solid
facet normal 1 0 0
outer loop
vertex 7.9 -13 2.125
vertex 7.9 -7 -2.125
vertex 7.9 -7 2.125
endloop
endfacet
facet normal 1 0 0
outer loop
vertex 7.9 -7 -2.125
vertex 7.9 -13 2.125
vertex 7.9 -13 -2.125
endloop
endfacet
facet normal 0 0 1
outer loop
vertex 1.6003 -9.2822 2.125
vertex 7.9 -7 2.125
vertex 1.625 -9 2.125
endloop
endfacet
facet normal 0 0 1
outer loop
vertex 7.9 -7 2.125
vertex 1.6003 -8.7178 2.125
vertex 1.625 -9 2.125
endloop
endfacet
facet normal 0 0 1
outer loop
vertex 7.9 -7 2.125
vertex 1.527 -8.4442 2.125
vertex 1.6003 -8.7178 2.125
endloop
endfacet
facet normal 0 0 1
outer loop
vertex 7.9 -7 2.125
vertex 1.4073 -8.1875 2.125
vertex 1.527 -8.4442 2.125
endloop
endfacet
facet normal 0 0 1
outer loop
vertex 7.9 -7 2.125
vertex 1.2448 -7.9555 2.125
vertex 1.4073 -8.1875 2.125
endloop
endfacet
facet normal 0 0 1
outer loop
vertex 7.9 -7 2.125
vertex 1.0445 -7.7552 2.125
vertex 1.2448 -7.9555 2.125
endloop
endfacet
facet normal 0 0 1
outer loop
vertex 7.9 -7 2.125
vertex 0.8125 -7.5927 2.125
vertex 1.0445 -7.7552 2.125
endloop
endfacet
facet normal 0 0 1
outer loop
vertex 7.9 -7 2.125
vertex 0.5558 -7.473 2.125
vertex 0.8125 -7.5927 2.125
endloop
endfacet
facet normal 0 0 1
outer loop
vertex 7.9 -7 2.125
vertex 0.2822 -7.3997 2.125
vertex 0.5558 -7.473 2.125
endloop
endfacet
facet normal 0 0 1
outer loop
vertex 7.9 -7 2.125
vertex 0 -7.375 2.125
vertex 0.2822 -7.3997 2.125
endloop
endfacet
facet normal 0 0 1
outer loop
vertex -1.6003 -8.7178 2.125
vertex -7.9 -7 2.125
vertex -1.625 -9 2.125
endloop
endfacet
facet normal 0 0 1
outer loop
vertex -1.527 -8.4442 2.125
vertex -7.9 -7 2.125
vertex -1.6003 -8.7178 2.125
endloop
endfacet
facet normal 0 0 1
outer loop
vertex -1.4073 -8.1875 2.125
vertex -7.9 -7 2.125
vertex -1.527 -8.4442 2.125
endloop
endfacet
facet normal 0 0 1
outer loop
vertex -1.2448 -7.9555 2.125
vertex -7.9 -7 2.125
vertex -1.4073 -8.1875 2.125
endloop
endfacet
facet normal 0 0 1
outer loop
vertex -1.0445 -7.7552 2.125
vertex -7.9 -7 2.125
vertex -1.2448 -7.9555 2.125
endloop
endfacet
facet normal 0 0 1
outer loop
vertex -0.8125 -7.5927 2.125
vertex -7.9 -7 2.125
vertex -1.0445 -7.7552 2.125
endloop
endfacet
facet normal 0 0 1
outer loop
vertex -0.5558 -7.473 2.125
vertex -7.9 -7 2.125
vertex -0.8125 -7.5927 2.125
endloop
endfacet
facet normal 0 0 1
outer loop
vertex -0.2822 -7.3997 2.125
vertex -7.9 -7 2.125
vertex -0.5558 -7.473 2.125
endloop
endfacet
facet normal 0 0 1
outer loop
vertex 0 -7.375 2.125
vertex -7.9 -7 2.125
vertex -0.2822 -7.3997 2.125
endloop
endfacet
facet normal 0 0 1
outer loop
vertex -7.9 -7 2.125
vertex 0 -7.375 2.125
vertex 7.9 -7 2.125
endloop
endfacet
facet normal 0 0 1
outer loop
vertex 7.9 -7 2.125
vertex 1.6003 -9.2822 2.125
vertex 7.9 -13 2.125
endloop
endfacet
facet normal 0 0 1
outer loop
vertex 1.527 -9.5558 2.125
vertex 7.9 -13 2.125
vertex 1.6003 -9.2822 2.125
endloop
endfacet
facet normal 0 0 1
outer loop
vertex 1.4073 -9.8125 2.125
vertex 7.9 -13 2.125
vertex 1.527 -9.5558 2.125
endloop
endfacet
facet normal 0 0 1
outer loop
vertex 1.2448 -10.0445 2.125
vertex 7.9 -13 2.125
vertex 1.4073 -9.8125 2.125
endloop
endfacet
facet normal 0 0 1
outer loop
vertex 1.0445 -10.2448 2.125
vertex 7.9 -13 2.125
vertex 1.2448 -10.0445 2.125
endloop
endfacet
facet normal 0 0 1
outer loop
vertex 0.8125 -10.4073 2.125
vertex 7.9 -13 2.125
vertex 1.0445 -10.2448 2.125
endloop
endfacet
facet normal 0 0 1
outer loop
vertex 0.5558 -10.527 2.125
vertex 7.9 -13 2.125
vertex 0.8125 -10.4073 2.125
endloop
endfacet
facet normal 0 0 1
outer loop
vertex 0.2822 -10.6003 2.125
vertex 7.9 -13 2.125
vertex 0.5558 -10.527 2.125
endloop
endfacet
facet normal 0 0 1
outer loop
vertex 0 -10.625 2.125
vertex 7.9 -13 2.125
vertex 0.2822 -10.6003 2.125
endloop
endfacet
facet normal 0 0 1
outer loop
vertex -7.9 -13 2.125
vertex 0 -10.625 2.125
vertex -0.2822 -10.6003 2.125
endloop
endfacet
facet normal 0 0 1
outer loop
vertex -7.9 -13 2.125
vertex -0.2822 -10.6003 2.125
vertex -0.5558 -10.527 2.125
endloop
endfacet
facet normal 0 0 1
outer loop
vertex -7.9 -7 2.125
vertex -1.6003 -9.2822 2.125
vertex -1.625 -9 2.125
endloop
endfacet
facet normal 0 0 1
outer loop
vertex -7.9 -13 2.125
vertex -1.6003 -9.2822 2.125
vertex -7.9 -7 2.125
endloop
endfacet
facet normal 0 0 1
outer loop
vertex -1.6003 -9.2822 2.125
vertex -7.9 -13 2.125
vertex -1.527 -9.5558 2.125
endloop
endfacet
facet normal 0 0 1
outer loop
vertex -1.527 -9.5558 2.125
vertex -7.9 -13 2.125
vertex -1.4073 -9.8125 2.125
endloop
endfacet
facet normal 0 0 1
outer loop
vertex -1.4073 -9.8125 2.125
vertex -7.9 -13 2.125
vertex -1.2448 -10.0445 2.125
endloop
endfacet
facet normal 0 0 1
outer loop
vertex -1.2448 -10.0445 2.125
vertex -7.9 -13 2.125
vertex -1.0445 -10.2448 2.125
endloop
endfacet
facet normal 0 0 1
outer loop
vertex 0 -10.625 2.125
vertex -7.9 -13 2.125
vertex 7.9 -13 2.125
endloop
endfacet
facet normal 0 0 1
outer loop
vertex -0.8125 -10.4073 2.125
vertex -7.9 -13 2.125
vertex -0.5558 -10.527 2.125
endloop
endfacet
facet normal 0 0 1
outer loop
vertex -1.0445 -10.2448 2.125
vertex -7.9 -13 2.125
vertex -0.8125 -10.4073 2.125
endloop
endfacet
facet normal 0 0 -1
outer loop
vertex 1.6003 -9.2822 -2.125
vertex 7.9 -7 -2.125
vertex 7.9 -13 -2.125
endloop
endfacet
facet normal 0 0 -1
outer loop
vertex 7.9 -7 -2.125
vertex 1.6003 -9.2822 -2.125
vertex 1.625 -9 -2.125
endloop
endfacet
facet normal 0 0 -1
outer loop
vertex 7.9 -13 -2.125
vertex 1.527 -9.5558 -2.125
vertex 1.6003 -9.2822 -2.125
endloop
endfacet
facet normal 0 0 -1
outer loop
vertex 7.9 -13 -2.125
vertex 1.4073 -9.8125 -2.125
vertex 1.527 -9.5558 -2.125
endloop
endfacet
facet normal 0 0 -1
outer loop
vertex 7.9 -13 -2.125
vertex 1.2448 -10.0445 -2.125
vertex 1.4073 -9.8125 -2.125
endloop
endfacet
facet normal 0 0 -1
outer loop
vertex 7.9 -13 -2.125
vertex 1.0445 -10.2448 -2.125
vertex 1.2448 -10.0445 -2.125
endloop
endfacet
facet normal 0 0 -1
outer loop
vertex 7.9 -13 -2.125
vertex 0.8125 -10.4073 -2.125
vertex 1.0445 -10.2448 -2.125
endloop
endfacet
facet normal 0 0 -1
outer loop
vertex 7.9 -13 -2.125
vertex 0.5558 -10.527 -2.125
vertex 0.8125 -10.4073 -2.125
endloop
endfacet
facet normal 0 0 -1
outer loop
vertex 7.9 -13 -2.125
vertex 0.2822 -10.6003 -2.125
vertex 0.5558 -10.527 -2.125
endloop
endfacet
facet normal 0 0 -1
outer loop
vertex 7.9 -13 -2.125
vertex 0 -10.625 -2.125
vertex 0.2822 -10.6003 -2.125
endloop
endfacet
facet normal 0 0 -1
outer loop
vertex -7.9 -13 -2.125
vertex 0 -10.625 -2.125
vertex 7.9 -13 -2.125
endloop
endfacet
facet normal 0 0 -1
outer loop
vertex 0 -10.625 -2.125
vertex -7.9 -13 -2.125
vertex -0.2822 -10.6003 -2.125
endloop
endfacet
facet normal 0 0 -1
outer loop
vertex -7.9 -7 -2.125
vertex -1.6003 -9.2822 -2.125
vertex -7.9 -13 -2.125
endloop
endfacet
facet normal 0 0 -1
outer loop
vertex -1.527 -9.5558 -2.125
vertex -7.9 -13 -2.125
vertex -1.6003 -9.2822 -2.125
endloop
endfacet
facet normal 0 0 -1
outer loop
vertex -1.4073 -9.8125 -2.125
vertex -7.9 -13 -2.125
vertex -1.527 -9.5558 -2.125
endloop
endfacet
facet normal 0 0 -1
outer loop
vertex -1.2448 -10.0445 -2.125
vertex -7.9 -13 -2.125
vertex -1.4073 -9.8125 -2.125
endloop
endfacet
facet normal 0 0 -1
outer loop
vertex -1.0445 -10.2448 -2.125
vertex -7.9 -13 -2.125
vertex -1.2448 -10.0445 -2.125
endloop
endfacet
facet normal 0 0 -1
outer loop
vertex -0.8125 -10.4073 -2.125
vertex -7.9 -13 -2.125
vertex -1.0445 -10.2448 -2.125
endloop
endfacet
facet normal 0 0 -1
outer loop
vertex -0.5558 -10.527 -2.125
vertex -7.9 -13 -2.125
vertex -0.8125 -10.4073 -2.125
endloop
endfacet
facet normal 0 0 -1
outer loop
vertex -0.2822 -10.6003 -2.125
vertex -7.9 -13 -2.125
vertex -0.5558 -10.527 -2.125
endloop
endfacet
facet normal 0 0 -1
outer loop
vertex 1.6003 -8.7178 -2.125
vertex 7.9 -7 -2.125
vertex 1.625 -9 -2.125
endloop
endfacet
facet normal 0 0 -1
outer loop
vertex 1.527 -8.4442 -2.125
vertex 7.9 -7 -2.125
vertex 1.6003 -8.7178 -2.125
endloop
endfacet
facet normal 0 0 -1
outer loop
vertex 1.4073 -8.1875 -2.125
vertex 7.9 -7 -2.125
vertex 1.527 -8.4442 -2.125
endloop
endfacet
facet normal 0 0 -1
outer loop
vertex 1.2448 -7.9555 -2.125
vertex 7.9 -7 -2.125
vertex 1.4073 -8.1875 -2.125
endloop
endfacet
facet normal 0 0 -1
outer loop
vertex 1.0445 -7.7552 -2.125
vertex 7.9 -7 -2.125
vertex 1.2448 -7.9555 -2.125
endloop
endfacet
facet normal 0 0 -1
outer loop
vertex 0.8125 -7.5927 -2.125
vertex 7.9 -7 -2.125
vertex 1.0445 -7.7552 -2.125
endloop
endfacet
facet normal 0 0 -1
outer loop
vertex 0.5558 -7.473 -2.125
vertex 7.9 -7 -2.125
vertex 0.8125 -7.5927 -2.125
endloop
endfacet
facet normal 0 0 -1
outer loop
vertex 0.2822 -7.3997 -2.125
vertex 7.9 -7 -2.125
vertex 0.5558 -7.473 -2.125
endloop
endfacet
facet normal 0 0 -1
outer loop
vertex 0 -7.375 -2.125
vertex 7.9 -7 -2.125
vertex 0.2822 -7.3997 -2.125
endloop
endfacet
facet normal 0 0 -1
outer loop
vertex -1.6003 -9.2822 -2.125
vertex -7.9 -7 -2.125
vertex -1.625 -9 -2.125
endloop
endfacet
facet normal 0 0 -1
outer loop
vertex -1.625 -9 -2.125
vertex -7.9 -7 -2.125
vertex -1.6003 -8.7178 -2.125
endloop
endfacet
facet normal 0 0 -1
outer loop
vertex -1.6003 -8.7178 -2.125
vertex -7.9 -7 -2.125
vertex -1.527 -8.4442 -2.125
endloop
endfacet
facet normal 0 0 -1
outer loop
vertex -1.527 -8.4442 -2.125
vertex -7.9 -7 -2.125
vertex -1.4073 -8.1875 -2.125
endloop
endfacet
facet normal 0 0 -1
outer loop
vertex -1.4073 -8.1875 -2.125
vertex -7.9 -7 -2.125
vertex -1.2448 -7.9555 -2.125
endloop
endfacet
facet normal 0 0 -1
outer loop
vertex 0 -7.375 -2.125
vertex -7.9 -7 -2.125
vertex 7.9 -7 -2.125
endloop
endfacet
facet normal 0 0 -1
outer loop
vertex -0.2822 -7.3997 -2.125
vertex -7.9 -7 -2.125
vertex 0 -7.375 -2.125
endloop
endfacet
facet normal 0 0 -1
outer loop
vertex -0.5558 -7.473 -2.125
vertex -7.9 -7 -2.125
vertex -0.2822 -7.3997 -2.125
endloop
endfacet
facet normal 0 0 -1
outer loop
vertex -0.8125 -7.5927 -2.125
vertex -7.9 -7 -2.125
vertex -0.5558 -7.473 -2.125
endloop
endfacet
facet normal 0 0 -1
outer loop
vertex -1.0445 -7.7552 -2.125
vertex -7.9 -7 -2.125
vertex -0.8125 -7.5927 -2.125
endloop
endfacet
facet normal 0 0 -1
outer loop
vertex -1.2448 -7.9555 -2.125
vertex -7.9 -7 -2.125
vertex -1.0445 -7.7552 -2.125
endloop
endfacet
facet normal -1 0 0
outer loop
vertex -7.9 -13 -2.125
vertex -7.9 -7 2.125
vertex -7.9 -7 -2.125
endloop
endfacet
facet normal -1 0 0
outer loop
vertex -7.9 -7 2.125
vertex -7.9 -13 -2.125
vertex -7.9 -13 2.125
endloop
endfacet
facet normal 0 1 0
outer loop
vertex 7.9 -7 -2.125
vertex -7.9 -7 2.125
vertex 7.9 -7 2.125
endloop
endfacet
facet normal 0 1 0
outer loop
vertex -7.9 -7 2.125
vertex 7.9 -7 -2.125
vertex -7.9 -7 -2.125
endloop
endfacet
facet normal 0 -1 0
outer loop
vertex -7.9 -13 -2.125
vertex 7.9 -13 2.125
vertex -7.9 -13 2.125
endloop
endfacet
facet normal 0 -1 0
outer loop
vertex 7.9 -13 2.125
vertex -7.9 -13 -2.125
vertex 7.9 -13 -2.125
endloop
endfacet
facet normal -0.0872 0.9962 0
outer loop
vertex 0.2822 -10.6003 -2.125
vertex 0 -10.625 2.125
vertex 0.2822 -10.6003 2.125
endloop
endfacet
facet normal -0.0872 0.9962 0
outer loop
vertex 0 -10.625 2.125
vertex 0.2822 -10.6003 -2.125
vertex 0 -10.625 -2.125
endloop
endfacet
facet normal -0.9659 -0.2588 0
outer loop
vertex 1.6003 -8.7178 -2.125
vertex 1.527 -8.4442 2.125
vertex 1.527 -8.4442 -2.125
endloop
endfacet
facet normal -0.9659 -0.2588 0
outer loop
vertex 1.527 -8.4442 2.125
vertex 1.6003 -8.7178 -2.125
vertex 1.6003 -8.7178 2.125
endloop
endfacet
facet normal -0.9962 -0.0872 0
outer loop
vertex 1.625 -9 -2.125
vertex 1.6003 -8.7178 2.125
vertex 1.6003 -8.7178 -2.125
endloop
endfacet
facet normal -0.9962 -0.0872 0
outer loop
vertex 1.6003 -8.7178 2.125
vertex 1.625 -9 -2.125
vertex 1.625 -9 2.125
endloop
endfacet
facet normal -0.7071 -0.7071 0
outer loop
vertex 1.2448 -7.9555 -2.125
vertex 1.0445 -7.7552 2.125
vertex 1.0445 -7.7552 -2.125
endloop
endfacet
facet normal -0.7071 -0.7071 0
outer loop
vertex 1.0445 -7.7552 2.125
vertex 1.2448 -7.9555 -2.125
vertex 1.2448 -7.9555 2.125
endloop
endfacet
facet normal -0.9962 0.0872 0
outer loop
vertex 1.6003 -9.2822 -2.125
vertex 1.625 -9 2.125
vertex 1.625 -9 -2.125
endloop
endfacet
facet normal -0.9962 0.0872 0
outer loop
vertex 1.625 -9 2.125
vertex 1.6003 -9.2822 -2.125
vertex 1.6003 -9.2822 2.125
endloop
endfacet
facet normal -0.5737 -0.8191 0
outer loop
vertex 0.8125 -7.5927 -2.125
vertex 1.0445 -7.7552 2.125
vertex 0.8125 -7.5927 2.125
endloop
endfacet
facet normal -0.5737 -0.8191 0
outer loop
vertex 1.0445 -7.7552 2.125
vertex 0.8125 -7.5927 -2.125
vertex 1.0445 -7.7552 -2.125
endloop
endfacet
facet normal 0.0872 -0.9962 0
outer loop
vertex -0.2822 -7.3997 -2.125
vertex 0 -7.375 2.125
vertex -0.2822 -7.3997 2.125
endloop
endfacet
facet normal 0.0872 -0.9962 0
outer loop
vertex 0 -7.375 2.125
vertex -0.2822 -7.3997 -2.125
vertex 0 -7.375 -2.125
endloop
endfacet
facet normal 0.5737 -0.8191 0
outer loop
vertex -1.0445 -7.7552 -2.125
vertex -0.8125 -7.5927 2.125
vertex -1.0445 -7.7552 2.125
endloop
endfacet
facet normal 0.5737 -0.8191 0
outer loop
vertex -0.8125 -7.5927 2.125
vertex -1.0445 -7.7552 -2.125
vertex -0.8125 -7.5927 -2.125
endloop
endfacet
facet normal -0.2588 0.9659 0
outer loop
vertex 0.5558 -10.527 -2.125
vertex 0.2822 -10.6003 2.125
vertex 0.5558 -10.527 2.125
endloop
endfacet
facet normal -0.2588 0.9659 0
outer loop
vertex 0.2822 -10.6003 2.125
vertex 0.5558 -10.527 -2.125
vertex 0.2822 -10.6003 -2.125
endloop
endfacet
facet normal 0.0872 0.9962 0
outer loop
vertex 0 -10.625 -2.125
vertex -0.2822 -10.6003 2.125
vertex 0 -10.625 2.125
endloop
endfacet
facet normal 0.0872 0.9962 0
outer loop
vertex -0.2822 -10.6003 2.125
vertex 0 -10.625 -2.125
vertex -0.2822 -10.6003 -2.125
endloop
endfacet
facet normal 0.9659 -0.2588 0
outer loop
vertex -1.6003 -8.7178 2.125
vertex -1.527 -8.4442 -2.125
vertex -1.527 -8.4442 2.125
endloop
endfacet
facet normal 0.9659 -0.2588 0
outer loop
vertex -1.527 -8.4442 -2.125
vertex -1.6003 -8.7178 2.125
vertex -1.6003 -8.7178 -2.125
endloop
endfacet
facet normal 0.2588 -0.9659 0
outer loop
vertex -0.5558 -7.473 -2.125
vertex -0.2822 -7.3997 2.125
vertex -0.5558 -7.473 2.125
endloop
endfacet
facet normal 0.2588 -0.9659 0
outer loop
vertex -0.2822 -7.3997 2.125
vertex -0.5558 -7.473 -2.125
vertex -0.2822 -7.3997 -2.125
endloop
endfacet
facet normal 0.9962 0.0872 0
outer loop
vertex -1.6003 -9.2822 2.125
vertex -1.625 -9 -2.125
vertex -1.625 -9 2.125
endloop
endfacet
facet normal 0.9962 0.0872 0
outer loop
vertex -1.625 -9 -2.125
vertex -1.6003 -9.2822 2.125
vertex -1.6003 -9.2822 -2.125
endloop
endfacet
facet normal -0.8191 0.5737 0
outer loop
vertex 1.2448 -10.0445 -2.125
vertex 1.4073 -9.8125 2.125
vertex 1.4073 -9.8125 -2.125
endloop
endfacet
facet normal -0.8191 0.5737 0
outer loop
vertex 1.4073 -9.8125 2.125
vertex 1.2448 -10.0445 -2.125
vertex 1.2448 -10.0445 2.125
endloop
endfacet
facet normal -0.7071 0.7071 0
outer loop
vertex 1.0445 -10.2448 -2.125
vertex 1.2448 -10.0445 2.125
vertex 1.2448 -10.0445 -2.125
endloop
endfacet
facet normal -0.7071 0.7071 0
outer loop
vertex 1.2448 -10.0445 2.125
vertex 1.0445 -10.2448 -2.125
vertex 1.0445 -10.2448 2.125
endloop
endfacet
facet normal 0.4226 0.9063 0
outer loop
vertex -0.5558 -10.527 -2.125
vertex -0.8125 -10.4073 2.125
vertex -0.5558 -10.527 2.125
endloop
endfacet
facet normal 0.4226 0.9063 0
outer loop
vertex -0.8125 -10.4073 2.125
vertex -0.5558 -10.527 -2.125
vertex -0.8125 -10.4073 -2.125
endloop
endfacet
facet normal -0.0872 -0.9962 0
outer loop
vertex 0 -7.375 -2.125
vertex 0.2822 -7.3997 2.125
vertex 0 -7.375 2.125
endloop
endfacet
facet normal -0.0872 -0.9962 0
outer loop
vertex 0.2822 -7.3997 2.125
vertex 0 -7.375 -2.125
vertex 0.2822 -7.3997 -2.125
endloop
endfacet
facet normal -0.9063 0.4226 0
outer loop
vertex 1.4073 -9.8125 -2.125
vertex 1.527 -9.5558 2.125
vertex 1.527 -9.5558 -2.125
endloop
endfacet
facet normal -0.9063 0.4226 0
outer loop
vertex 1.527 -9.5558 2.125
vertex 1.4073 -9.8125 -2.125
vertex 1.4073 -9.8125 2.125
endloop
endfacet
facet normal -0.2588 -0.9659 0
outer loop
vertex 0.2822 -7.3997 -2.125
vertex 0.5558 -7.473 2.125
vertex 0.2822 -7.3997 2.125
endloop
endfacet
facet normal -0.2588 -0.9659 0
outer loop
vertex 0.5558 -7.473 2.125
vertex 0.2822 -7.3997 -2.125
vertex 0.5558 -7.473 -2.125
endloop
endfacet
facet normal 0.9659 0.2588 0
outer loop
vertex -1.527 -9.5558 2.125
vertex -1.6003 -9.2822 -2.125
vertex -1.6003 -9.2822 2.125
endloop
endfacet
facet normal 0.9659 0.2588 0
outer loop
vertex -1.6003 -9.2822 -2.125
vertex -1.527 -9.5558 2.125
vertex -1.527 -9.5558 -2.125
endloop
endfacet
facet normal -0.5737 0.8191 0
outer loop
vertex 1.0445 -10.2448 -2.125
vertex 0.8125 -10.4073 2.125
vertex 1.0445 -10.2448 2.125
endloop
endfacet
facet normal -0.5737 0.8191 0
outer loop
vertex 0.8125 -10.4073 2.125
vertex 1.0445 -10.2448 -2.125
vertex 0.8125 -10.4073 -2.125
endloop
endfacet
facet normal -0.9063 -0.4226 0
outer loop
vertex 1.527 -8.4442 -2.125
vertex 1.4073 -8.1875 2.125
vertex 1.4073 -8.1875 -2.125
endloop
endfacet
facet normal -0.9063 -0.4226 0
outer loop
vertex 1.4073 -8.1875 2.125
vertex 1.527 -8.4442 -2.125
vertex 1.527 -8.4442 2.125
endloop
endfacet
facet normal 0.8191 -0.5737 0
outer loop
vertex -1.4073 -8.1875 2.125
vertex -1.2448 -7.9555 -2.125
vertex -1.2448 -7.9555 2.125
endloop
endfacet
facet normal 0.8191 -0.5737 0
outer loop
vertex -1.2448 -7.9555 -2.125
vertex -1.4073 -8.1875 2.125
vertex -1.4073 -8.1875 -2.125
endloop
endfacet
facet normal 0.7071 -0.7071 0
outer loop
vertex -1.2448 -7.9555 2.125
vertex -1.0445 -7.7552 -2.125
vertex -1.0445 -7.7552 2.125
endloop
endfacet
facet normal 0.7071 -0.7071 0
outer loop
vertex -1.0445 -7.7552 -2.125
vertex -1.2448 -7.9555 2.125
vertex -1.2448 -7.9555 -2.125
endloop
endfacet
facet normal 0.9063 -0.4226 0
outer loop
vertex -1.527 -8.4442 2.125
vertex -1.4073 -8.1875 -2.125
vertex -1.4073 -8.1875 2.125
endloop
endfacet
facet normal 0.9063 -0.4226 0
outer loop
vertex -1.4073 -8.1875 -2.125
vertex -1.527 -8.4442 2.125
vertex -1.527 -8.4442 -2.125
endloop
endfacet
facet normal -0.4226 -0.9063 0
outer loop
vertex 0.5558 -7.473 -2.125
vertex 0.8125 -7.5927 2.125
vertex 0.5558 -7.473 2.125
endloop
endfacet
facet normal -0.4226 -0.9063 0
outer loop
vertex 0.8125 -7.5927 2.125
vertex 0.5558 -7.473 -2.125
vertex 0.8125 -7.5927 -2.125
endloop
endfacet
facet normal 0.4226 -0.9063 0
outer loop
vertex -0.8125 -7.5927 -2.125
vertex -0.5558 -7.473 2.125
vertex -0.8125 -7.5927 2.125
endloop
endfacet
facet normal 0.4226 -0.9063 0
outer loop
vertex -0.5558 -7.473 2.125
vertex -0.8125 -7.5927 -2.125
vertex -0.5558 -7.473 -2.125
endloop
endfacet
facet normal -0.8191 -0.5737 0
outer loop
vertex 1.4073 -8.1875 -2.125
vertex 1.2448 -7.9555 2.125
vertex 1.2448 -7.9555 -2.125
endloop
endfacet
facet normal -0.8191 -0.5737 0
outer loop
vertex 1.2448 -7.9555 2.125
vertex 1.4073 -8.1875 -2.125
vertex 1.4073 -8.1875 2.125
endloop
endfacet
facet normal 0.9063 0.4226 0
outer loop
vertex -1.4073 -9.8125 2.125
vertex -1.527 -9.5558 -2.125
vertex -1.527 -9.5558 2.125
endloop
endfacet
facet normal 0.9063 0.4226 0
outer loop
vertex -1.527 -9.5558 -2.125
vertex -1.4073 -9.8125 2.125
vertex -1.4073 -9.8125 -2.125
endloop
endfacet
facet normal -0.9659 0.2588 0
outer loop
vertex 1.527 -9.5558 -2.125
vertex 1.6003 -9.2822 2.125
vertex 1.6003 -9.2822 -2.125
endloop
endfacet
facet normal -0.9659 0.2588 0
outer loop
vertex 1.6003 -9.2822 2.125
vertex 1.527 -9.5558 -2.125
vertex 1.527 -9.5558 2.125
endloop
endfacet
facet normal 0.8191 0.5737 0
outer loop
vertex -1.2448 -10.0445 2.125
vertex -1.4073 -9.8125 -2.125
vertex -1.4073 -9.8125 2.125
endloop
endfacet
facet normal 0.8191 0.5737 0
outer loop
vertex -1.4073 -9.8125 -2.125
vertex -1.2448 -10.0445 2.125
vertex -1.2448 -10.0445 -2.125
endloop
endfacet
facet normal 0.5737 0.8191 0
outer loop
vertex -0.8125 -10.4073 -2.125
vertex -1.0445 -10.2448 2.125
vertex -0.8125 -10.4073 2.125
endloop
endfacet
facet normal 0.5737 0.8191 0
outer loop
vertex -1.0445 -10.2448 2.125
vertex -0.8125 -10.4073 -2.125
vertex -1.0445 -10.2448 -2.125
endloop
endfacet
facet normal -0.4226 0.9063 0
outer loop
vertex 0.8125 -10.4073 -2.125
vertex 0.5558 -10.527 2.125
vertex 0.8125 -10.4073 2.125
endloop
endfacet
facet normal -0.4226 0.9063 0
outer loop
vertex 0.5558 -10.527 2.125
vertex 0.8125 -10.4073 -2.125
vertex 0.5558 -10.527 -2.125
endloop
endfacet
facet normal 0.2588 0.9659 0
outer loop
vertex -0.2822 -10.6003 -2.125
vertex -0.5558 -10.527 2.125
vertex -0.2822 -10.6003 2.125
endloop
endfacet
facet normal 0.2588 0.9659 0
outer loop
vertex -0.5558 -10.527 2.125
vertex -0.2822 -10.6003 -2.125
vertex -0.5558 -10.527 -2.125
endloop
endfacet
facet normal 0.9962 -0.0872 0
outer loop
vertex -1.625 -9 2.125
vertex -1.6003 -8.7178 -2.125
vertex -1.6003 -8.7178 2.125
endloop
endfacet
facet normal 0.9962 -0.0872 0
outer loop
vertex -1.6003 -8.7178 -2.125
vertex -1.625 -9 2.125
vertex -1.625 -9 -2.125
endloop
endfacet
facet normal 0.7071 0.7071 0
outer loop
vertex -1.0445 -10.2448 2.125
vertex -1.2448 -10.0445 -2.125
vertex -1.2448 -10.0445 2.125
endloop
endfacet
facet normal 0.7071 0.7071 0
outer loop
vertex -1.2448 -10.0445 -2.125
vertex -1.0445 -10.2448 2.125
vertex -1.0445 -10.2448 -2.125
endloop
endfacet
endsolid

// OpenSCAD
/*
 * Grünstahl Case
 * Copyright (c) 2025 Lone Dynamics Corporation. All rights reserved.
 *
 * required hardware:
 *  - 1 x M2.5 x 10mm countersunk bolt
 *  - 1 x M2.5 nut
 *
 */

$fn = 30;

box_width = 19;
box_length = 26;
box_height = 10.5;
box_thickness = 2.0;

lid_thickness = 3;

cutout_width = 16.10;
cutout_length = 42.5;
cutout_height = 4.5;

cutout_usb_width = 8.4;

board_height = 0.8;

roundness = 1;

toladj = 0.25;

//translate([0,-5.25,0]) ssg_board(-0.25);
//translate([0,0,-0.5]) ssg_case();
translate([0,4.5,0]) ssg_endcap(0);

// m2.5 bolt
//translate([0,-11.5,-6.25]) color([1,0,0]) cylinder(d=2.5, h=12, $fn=36);

// m2.5 nut
//translate([0,-13.5,-6.55]) rotate(30) color([1,0,0]) cylinder(d=5.8, h=2.4, $fn=6);

module ssg_board(o)
{
	
	difference() {
		union() {
			translate([0,7,o])
				color([0.0,0.8,0.0]) cube([16, 16, 1.6], center=true);
			translate([0,20,o])
				color([0.9,0.9,0.9]) cube([8.2, 10, 2.4], center=true);
		}
		translate([0,-11,-10]) cylinder(d=4.2, h=100);
	}
	
}

module ssg_endcap(o)
{
		 	
	difference() {
        translate([0,-14.5,0]) cube([15.8,6,4.25], center=true);
		translate([0,-13.5,-4.25]) color([1,0,0]) cylinder(d=3.25, h=8, $fn=36);

	}
}

module ssg_case()
{
	
	difference() {
		
		minkowski() {
			cube([box_width-(roundness*2),box_length-(roundness*2),box_height-(roundness*2)],
				center=true);
			sphere(roundness);
		}
	
		translate([0,-10.5,(box_height-cutout_height)/2-2.5])
			cube([cutout_width+toladj,cutout_length,cutout_height], center=true);

		// USB cutout
		translate([0,10,0.25])
			cube([cutout_usb_width+toladj,10,2.4+toladj], center=true);

		// bolt hole
		translate([0,-9,-5]) cylinder(d=2.75+toladj, h=100, $fn=36);
		
		// nut cutout
		translate([0,-9,-5.75]) rotate(0) cylinder(d=6+toladj, h=2.5, $fn=6);
		
		// lid notch cutout
		translate([0,-9,4.25]) cylinder(d=5+toladj, h=100);

	}

}
